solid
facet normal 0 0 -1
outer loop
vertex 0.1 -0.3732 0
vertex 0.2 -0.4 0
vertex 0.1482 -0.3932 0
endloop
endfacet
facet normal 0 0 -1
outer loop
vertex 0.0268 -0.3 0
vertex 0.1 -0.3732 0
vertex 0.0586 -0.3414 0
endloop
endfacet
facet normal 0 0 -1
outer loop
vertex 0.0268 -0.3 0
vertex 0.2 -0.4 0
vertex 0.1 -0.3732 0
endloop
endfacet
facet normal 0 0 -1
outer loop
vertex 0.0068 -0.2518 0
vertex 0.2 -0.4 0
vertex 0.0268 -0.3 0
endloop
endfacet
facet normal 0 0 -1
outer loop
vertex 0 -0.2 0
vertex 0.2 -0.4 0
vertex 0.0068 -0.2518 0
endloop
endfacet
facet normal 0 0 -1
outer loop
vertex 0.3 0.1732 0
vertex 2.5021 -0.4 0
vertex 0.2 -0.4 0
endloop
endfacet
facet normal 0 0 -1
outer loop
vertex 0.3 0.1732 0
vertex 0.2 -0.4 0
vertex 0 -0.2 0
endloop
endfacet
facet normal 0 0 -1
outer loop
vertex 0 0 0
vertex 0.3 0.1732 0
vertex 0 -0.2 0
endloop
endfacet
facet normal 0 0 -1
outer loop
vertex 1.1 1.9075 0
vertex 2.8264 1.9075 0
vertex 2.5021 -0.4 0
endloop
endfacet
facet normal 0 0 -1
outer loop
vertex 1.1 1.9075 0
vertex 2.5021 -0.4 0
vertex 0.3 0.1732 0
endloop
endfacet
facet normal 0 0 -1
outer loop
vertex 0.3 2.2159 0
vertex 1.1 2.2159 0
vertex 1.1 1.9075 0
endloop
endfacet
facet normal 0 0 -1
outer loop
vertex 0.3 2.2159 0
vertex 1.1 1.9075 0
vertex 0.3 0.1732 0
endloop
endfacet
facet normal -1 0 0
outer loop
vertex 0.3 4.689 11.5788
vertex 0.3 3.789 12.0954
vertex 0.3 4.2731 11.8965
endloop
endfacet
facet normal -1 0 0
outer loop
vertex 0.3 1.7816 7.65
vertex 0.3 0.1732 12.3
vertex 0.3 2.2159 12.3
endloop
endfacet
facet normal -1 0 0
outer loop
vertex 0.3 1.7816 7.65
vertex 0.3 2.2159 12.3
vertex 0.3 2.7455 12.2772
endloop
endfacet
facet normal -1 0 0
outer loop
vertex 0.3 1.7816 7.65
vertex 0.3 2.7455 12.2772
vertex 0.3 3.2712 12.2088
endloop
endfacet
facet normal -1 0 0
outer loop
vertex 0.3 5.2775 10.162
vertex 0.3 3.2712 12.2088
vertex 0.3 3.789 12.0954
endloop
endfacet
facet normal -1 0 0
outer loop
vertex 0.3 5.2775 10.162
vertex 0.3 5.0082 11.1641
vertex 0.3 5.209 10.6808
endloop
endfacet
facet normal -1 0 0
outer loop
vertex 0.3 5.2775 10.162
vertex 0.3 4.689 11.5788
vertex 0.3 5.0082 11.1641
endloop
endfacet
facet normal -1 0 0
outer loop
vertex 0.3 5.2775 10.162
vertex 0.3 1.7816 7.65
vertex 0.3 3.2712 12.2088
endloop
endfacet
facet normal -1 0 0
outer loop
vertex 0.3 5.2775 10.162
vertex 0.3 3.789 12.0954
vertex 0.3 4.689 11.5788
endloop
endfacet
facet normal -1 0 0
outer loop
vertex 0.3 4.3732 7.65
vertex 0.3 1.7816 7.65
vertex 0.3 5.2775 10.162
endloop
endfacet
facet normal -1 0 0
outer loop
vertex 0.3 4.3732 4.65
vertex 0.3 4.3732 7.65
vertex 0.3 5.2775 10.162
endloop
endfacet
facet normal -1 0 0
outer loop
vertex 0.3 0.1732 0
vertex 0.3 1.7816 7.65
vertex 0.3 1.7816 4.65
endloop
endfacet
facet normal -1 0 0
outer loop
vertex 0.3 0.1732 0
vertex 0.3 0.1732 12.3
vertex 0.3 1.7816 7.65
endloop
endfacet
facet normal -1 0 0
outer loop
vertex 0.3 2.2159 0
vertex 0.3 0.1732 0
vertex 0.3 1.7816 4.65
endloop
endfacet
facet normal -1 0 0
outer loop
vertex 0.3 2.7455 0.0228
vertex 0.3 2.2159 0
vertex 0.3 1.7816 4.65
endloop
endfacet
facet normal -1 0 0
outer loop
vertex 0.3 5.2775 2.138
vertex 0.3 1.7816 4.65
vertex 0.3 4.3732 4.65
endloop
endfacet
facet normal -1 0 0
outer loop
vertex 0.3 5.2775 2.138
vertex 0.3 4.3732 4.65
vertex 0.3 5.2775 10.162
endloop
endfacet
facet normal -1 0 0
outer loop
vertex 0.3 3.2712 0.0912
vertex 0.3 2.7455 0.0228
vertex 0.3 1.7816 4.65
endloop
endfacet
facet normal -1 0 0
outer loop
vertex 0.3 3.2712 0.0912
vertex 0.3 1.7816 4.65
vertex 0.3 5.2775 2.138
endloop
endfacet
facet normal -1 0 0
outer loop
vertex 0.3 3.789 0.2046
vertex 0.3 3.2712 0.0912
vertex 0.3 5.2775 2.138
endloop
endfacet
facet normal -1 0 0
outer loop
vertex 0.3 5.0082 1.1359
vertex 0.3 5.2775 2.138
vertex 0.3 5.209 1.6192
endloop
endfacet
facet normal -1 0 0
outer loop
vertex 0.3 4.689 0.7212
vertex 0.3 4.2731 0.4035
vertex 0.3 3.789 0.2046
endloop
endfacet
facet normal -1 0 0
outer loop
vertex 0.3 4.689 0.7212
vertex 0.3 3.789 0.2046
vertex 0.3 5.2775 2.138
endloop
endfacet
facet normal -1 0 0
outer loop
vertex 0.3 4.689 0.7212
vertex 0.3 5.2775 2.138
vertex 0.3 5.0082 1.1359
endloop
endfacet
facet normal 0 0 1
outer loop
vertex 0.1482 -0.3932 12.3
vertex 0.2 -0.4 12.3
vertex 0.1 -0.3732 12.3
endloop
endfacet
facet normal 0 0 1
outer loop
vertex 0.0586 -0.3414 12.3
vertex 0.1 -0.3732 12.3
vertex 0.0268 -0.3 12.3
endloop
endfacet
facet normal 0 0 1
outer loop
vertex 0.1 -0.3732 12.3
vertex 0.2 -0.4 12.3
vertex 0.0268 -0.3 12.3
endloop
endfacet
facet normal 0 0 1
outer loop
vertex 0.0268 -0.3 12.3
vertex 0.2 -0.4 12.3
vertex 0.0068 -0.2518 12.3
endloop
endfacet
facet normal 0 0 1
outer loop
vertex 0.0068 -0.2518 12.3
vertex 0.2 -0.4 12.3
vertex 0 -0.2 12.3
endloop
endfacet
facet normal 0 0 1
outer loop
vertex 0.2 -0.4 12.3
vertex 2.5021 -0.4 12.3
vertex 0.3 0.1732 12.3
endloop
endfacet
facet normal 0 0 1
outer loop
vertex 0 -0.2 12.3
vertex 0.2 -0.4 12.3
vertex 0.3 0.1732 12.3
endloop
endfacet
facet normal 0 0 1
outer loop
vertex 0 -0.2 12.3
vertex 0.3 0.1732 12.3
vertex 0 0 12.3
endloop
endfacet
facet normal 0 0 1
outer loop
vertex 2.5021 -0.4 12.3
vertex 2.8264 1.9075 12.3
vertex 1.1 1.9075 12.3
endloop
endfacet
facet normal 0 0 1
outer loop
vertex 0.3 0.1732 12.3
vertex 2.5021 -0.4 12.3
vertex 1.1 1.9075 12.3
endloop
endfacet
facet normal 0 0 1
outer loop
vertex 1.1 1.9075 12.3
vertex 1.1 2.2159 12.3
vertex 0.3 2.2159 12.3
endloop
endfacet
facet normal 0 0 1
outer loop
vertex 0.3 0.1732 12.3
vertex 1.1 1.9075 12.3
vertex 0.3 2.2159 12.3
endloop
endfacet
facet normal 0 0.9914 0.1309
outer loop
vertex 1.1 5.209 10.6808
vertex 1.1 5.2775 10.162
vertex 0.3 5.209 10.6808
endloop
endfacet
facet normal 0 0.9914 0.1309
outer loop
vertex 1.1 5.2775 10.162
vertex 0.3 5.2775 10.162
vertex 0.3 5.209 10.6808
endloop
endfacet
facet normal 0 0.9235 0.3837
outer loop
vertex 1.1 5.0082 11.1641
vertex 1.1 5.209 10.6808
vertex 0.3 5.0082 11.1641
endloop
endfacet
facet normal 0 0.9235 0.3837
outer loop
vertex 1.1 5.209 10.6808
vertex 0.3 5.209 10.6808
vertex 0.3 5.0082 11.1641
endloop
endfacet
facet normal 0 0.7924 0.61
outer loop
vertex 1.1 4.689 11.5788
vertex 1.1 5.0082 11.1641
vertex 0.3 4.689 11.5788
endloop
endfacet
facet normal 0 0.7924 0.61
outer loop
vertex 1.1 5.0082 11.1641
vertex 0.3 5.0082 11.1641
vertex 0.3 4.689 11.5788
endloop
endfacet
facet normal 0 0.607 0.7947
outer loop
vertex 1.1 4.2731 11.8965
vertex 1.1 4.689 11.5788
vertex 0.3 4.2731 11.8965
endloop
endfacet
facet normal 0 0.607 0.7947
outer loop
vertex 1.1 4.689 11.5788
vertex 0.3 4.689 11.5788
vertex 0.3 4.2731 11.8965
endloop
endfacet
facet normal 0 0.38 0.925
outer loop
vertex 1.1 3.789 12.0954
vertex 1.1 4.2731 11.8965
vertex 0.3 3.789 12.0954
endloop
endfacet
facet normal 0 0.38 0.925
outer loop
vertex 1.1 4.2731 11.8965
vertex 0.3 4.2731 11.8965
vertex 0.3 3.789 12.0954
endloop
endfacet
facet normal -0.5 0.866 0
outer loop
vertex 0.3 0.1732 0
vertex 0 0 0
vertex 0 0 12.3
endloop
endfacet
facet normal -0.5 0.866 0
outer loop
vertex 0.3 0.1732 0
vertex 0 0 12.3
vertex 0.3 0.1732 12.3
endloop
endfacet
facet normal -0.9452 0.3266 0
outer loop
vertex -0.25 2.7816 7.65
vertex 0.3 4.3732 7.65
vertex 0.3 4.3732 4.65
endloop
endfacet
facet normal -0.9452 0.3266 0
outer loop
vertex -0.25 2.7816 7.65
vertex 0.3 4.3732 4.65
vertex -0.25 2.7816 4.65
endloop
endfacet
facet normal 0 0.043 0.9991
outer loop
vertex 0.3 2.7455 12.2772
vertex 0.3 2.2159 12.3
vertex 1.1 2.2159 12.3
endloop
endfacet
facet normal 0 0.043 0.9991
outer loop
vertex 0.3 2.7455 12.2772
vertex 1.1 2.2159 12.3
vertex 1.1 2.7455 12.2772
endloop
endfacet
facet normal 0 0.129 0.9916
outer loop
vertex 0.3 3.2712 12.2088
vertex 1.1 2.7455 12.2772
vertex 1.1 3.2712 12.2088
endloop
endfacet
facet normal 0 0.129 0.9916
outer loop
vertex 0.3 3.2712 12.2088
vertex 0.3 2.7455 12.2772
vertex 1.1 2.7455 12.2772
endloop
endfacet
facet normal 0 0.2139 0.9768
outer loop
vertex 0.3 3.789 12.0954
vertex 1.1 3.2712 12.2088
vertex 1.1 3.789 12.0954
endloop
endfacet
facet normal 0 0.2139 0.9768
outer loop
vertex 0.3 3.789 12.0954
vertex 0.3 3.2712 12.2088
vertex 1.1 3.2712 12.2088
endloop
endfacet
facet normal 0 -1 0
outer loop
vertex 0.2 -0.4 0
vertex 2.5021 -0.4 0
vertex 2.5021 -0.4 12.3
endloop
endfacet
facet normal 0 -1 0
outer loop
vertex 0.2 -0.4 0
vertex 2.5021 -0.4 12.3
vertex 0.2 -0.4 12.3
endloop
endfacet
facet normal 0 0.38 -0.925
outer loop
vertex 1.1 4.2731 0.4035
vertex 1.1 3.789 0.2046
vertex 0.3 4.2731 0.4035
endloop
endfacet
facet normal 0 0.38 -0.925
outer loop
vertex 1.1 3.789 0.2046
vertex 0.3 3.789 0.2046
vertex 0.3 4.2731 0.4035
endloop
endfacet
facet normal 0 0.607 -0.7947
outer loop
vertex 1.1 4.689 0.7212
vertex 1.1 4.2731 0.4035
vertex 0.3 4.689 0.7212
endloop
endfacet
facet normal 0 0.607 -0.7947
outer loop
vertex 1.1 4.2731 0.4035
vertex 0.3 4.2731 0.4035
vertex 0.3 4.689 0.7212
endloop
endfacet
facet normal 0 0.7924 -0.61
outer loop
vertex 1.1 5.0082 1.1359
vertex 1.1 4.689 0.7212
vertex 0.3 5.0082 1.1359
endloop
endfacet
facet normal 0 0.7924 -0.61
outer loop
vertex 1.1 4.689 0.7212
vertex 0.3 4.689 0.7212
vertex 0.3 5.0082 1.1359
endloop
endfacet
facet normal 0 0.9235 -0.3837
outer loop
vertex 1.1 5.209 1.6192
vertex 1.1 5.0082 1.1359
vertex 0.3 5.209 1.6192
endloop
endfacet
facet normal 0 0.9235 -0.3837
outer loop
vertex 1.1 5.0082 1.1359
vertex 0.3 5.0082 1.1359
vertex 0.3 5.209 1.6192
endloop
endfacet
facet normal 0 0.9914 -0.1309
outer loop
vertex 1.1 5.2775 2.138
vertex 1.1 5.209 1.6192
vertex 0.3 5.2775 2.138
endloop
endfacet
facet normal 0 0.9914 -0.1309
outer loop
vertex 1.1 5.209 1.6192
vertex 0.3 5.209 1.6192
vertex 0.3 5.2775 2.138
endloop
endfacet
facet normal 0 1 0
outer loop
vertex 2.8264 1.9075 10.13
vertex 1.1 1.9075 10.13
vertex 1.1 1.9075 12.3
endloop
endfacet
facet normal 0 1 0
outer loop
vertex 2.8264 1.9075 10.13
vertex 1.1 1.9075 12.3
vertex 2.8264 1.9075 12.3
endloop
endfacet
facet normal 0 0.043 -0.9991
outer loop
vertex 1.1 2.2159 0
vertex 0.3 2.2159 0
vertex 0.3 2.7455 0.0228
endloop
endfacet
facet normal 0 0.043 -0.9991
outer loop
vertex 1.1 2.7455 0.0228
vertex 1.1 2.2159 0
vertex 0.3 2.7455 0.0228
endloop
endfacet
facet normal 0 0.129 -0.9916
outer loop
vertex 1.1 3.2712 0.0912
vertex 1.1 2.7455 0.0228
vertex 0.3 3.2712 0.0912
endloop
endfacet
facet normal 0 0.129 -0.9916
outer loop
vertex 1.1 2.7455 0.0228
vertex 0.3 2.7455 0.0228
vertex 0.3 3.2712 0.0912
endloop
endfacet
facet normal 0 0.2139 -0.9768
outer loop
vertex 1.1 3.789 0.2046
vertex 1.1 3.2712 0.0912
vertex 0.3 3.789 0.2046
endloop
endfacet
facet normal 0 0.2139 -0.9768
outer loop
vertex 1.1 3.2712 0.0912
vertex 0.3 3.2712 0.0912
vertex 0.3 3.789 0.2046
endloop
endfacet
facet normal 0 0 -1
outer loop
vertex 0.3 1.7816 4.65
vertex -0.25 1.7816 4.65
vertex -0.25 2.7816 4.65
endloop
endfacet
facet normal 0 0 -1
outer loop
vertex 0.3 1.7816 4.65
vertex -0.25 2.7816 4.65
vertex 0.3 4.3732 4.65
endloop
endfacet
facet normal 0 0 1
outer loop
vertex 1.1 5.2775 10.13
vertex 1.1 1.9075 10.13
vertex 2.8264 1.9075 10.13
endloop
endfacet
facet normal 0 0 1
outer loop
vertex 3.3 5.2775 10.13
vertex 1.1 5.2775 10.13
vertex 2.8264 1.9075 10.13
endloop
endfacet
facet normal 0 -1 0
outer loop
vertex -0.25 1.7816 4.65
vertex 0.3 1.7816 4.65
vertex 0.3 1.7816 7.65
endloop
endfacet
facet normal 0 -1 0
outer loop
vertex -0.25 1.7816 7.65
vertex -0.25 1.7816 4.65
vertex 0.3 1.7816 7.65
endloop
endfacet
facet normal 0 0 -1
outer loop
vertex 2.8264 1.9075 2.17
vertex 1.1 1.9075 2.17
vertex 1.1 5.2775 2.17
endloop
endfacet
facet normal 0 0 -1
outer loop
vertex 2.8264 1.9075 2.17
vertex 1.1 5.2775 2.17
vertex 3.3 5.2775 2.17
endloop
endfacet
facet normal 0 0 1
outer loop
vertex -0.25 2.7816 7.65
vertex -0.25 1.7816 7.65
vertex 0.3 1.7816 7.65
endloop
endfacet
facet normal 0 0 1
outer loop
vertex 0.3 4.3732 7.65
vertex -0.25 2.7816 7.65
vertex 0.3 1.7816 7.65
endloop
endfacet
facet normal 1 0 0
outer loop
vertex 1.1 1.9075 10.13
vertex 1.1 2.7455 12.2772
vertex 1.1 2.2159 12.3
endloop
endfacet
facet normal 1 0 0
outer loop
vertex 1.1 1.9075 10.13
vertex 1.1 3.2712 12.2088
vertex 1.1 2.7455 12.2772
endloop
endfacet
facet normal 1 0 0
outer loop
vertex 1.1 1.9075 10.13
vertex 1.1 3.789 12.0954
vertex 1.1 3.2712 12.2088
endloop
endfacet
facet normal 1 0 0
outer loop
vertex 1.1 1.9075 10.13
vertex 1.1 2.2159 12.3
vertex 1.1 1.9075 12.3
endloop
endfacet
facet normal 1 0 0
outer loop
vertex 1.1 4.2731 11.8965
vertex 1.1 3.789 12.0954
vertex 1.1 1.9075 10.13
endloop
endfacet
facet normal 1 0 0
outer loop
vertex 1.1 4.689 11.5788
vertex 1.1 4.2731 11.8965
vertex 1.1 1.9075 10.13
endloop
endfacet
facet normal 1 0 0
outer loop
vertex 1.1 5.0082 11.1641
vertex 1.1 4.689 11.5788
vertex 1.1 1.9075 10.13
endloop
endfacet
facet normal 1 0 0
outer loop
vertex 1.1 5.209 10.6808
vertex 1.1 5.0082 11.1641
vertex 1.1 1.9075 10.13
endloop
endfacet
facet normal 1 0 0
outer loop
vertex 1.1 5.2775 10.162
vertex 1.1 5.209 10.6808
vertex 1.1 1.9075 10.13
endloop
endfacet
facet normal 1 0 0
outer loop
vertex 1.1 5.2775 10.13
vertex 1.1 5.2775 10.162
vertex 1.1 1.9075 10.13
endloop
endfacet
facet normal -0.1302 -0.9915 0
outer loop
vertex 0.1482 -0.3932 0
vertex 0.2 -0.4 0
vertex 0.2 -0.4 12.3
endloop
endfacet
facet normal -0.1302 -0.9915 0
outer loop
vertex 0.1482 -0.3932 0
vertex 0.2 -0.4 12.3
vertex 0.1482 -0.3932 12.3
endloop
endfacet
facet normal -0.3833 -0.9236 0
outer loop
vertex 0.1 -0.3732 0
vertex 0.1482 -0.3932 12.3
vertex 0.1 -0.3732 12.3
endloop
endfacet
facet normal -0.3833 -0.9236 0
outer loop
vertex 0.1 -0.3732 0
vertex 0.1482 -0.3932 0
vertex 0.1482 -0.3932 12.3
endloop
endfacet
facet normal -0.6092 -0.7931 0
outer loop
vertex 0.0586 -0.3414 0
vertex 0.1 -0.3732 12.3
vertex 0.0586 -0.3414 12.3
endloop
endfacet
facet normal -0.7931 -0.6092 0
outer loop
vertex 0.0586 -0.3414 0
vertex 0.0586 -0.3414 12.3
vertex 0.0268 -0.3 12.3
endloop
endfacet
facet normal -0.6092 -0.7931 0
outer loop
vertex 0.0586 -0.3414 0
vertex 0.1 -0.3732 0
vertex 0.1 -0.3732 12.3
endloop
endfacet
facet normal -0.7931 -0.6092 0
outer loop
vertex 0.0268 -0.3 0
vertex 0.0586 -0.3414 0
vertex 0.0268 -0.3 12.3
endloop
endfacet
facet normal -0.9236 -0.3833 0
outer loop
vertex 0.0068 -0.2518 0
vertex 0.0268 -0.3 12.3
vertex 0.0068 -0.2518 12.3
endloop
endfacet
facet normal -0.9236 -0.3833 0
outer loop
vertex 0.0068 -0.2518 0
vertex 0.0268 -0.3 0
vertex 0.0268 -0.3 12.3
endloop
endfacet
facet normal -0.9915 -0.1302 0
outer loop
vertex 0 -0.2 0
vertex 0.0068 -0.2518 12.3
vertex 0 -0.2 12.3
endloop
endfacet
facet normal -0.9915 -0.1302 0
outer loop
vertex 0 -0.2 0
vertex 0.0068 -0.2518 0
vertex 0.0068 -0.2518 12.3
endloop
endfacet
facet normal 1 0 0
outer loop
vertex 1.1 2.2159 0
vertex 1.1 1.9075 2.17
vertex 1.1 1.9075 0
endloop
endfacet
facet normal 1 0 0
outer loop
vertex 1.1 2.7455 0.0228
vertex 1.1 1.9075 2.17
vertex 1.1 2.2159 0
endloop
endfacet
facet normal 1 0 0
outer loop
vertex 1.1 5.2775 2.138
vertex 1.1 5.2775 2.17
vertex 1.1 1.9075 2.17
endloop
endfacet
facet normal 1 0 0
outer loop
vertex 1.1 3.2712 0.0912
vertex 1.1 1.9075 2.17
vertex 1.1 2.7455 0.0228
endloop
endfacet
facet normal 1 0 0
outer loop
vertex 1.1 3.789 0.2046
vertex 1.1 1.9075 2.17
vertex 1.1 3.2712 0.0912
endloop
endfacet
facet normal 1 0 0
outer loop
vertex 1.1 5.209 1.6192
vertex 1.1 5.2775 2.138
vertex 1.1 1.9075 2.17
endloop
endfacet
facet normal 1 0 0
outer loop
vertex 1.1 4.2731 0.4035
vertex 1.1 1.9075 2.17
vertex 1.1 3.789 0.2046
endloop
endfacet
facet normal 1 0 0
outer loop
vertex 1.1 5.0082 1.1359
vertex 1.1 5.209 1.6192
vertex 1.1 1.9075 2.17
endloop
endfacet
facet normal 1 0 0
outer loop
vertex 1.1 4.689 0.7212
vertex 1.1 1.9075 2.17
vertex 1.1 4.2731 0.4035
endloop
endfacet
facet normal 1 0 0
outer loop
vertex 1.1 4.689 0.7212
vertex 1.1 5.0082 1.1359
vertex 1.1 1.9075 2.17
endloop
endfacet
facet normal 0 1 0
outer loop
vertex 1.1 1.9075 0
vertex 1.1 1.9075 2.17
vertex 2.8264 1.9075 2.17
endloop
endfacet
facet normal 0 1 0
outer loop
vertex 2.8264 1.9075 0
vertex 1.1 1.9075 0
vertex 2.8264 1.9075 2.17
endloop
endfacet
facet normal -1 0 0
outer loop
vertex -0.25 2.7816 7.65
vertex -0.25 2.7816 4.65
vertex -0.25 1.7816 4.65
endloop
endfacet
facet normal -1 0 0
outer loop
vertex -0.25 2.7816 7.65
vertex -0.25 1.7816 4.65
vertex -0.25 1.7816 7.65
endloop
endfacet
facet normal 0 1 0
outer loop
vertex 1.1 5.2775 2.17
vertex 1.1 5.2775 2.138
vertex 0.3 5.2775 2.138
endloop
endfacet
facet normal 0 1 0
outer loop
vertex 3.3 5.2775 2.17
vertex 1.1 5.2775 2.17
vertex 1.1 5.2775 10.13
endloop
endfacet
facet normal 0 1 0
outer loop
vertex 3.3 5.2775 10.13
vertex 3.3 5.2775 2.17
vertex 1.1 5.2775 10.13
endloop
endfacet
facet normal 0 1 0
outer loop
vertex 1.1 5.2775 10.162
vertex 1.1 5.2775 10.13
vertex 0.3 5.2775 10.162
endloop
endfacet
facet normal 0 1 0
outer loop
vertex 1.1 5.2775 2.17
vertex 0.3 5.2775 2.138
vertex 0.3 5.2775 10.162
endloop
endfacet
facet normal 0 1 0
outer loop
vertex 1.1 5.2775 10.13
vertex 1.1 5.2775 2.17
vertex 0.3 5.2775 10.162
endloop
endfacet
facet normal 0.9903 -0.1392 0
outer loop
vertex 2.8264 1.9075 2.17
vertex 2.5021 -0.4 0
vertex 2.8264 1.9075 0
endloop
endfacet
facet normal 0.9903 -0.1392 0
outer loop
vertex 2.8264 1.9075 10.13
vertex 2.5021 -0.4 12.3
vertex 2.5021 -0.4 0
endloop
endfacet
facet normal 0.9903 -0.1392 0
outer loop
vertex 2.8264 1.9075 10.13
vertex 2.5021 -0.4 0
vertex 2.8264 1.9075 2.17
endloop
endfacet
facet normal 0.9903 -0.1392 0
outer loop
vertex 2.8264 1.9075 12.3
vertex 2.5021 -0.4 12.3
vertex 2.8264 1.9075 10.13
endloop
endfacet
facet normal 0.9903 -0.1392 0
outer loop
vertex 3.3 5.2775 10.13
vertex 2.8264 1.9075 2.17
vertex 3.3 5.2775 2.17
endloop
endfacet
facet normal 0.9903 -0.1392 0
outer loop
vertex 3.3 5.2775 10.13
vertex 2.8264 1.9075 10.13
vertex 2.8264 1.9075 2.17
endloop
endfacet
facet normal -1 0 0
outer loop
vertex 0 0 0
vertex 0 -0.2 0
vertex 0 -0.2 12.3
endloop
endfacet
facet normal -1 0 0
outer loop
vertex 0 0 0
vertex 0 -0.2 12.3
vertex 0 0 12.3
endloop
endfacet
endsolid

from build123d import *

# Parameters (mm, degrees)
BOSS_EXTRUDE1_DEPTH = 12.3
SKETCH2_W           = 2.2
SKETCH2_H           = 2.17
CUT_EXTRUDE1_DEPTH  = 4.2
CUT_EXTRUDE3_DEPTH  = 0.8
SKETCH5_W           = 3
SKETCH5_H           = 1
BOSS_EXTRUDE2_DEPTH = 0.55
BOSS_EXTRUDE3_DEPTH = 3
SKETCH7_W           = 13.013136742
SKETCH7_H           = 0.83
CUT_EXTRUDE4_DEPTH  = 15.056708453
FILLET1_R           = 2
CUT_EXTRUDE5_DEPTH  = 14.785193345


with BuildPart() as part:
    # Sketch1 → Boss-Extrude1 (new body)
    with BuildSketch(Plane.XY):
        with BuildLine():
            Line((0, 0), (0.299997713, 0.173208719))
            Line((0.299997713, 0.173208719), (0.299997713, 1.781598719))
            Line((0.299997713, 1.781598719), (0.299997713, 6.107458719))
            Line((0.299997713, 6.107458719), (3.299997713, 6.107458719))
            Line((3.299997713, 6.107458719), (3.299997713, 0.646828719))
            Line((3.299997713, 0.646828719), (3.299997713, -0.4))
            Line((3.299997713, -0.4), (0.2, -0.4))
            ThreePointArc((0.2, -0.4), (0.058578644, -0.341421356), (0, -0.2))
            Line((0, -0.2), (0, 0))
        make_face()
    extrude(amount=BOSS_EXTRUDE1_DEPTH)

    # Sketch2 → Cut-Extrude1 (cut)
    with BuildSketch(Plane(origin=(0, 6.107458719, 0), x_dir=(1, 0, 0), z_dir=(0, 1, 0))):
        with Locations((2.199997713, -1.085)):
            Rectangle(SKETCH2_W, SKETCH2_H)
        with Locations((2.199997713, -11.215)):
            Rectangle(SKETCH2_W, SKETCH2_H)
    extrude(amount=-CUT_EXTRUDE1_DEPTH, mode=Mode.SUBTRACT)

    # Sketch4 → Cut-Extrude3 (cut)
    with BuildSketch(Plane.ZY.offset(-0.299997713)):
        with BuildLine():
            Line((10.41158, 6.107458719), (12.3, 6.107458719))
            Line((12.3, 6.107458719), (12.3, 2.215929667))
            ThreePointArc((12.3, 2.215929667), (12.02880398, 4.022129667), (11.23913234, 5.669043272))
            ThreePointArc((11.23913234, 5.669043272), (10.879869522, 5.991150317), (10.41158, 6.107458719))
        make_face()
        with BuildLine():
            Line((1.88842, 6.107458719), (0, 6.107458719))
            Line((0, 6.107458719), (0, 2.215929667))
            ThreePointArc((0, 2.215929667), (0.27119602, 4.022129667), (1.06086766, 5.669043272))
            ThreePointArc((1.06086766, 5.669043272), (1.420130478, 5.991150317), (1.88842, 6.107458719))
        make_face()
    extrude(amount=-CUT_EXTRUDE3_DEPTH, mode=Mode.SUBTRACT)

    # Sketch5 → Boss-Extrude2 (add)
    with BuildSketch(Plane.ZY.offset(-0.299997713)):
        with Locations((6.15, 2.281598719)):
            Rectangle(SKETCH5_W, SKETCH5_H)
    extrude(amount=BOSS_EXTRUDE2_DEPTH)

    # Sketch6 → Boss-Extrude3 (add)
    with BuildSketch(Plane.XY.offset(7.65)):
        Polygon((0.299997713, 2.781598719), (0.299997713, 4.373208719), (-0.250002287, 2.781598719), align=None)
    extrude(amount=-BOSS_EXTRUDE3_DEPTH)

    # Sketch7 → Cut-Extrude4 (cut, through all)
    with BuildSketch(Plane.ZY.offset(-0.299997713)):
        with Locations((5.954326159, 5.69245873)):
            Rectangle(SKETCH7_W, SKETCH7_H)
    extrude(amount=-CUT_EXTRUDE4_DEPTH, mode=Mode.SUBTRACT)

    # Fillet1
    fillet1_edges = [part.edges().sort_by_distance(p)[0] for p in [
        (0.699997713, 5.27745873, 0.816134079),
        (0.699997713, 5.27745873, 11.483865921),
    ]]
    fillet(fillet1_edges, radius=FILLET1_R)

    # Sketch8 → Cut-Extrude5 (cut, through all)
    with BuildSketch(Plane.XY.offset(12.3)):
        Polygon((3.299997713, -0.4), (2.502082924, -0.4), (3.299997713, 5.27745873), align=None)
    extrude(amount=-CUT_EXTRUDE5_DEPTH, mode=Mode.SUBTRACT)


solid = part.part
